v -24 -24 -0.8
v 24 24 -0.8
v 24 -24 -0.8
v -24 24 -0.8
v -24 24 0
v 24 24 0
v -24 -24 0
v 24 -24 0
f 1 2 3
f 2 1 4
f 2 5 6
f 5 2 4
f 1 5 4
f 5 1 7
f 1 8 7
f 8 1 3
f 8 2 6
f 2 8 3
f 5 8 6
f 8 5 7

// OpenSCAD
// file: ../p/box5.scad
use <../lib.scad>
function ldraw_lib__box5() = [
// 0 Box with 5 Faces and All Edges
// 0 Name: box5.dat
// 0 Author: James Jessiman
// 0 !LDRAW_ORG Primitive UPDATE 2012-01
// 0 !LICENSE Licensed under CC BY 2.0 and CC BY 4.0 : see CAreadme.txt
// 
// 0 BFC CERTIFY CCW
  [0,"BFC","CERTIFY"],
  [0,"BFC","CCW"],
// 
// 0 !HISTORY 2002-04-03 [sbliss] Modified for BFC compliance
// 0 !HISTORY 2002-04-25 [PTadmin] Official Update 2002-02
// 0 !HISTORY 2007-06-24 [PTadmin] Header formatted for Contributor Agreement
// 0 !HISTORY 2008-07-01 [PTadmin] Official Update 2008-01
// 0 !HISTORY 2012-02-16 [Philo] Changed to CCW
// 0 !HISTORY 2012-03-30 [PTadmin] Official Update 2012-01
// 
// 
// 2 24 1 1 1 -1 1 1
  [2,24,1,1,1,-1,1,1],
// 2 24 -1 1 1 -1 1 -1
  [2,24,-1,1,1,-1,1,-1],
// 2 24 -1 1 -1 1 1 -1
  [2,24,-1,1,-1,1,1,-1],
// 2 24 1 1 -1 1 1 1
  [2,24,1,1,-1,1,1,1],
// 2 24 1 0 1 -1 0 1
  [2,24,1,0,1,-1,0,1],
// 2 24 -1 0 1 -1 0 -1
  [2,24,-1,0,1,-1,0,-1],
// 2 24 -1 0 -1 1 0 -1
  [2,24,-1,0,-1,1,0,-1],
// 2 24 1 0 -1 1 0 1
  [2,24,1,0,-1,1,0,1],
// 2 24 1 0 1 1 1 1
  [2,24,1,0,1,1,1,1],
// 2 24 -1 0 1 -1 1 1
  [2,24,-1,0,1,-1,1,1],
// 2 24 1 0 -1 1 1 -1
  [2,24,1,0,-1,1,1,-1],
// 2 24 -1 0 -1 -1 1 -1
  [2,24,-1,0,-1,-1,1,-1],
// 4 16 -1 1 1 1 1 1 1 1 -1 -1 1 -1
  [4,16,-1,1,1,1,1,1,1,1,-1,-1,1,-1],
// 4 16 -1 1 1 -1 0 1 1 0 1 1 1 1
  [4,16,-1,1,1,-1,0,1,1,0,1,1,1,1],
// 4 16 -1 1 -1 -1 0 -1 -1 0 1 -1 1 1
  [4,16,-1,1,-1,-1,0,-1,-1,0,1,-1,1,1],
// 4 16 1 1 -1 1 0 -1 -1 0 -1 -1 1 -1
  [4,16,1,1,-1,1,0,-1,-1,0,-1,-1,1,-1],
// 4 16 1 1 1 1 0 1 1 0 -1 1 1 -1
  [4,16,1,1,1,1,0,1,1,0,-1,1,1,-1],
];
makepoly(ldraw_lib__box5(), line=0.2);
// main file
use <../lib.scad>
use <../p/box5.scad>
function ldraw_lib__191767() = [
// 0 Cardboard  6 x  6 Thick with Sharp Corners with Cat Photo
// 0 Name: 191767.dat
// 0 Author: Steffen [Steffen]
// 0 !LDRAW_ORG Part UPDATE 2020-02
// 0 !LICENSE Licensed under CC BY 2.0 and CC BY 4.0 : see CAreadme.txt
// 
// 0 BFC CERTIFY CCW
  [0,"BFC","CERTIFY"],
  [0,"BFC","CCW"],
// 
// 0 !CATEGORY Sheet Cardboard
// 0 !KEYWORDS Scala, set 4336
// 
// 0 !HISTORY 2020-09-05 [PTadmin] Official Update 2020-02
// 
// 
// 1 16 0 0 0 60 0 0 0 2 0 0 0 60 box5.dat
  [1,16,0,0,0,60,0,0,0,2,0,0,0,60, ldraw_lib__box5()],
// 
// 0 !TEXMAP START PLANAR -60 0 60 60 0 60 -60 0 -60 191767.png
// 0 !: 4 16 -60 0 -60 60 0 -60 60 0 60 -60 0 60
// 0 !TEXMAP FALLBACK
// 4 16 -60 0 -60 60 0 -60 60 0 60 -60 0 60
  [4,16,-60,0,-60,60,0,-60,60,0,60,-60,0,60],
// 0 !TEXMAP END
];
makepoly(ldraw_lib__191767(), line=0.2);
